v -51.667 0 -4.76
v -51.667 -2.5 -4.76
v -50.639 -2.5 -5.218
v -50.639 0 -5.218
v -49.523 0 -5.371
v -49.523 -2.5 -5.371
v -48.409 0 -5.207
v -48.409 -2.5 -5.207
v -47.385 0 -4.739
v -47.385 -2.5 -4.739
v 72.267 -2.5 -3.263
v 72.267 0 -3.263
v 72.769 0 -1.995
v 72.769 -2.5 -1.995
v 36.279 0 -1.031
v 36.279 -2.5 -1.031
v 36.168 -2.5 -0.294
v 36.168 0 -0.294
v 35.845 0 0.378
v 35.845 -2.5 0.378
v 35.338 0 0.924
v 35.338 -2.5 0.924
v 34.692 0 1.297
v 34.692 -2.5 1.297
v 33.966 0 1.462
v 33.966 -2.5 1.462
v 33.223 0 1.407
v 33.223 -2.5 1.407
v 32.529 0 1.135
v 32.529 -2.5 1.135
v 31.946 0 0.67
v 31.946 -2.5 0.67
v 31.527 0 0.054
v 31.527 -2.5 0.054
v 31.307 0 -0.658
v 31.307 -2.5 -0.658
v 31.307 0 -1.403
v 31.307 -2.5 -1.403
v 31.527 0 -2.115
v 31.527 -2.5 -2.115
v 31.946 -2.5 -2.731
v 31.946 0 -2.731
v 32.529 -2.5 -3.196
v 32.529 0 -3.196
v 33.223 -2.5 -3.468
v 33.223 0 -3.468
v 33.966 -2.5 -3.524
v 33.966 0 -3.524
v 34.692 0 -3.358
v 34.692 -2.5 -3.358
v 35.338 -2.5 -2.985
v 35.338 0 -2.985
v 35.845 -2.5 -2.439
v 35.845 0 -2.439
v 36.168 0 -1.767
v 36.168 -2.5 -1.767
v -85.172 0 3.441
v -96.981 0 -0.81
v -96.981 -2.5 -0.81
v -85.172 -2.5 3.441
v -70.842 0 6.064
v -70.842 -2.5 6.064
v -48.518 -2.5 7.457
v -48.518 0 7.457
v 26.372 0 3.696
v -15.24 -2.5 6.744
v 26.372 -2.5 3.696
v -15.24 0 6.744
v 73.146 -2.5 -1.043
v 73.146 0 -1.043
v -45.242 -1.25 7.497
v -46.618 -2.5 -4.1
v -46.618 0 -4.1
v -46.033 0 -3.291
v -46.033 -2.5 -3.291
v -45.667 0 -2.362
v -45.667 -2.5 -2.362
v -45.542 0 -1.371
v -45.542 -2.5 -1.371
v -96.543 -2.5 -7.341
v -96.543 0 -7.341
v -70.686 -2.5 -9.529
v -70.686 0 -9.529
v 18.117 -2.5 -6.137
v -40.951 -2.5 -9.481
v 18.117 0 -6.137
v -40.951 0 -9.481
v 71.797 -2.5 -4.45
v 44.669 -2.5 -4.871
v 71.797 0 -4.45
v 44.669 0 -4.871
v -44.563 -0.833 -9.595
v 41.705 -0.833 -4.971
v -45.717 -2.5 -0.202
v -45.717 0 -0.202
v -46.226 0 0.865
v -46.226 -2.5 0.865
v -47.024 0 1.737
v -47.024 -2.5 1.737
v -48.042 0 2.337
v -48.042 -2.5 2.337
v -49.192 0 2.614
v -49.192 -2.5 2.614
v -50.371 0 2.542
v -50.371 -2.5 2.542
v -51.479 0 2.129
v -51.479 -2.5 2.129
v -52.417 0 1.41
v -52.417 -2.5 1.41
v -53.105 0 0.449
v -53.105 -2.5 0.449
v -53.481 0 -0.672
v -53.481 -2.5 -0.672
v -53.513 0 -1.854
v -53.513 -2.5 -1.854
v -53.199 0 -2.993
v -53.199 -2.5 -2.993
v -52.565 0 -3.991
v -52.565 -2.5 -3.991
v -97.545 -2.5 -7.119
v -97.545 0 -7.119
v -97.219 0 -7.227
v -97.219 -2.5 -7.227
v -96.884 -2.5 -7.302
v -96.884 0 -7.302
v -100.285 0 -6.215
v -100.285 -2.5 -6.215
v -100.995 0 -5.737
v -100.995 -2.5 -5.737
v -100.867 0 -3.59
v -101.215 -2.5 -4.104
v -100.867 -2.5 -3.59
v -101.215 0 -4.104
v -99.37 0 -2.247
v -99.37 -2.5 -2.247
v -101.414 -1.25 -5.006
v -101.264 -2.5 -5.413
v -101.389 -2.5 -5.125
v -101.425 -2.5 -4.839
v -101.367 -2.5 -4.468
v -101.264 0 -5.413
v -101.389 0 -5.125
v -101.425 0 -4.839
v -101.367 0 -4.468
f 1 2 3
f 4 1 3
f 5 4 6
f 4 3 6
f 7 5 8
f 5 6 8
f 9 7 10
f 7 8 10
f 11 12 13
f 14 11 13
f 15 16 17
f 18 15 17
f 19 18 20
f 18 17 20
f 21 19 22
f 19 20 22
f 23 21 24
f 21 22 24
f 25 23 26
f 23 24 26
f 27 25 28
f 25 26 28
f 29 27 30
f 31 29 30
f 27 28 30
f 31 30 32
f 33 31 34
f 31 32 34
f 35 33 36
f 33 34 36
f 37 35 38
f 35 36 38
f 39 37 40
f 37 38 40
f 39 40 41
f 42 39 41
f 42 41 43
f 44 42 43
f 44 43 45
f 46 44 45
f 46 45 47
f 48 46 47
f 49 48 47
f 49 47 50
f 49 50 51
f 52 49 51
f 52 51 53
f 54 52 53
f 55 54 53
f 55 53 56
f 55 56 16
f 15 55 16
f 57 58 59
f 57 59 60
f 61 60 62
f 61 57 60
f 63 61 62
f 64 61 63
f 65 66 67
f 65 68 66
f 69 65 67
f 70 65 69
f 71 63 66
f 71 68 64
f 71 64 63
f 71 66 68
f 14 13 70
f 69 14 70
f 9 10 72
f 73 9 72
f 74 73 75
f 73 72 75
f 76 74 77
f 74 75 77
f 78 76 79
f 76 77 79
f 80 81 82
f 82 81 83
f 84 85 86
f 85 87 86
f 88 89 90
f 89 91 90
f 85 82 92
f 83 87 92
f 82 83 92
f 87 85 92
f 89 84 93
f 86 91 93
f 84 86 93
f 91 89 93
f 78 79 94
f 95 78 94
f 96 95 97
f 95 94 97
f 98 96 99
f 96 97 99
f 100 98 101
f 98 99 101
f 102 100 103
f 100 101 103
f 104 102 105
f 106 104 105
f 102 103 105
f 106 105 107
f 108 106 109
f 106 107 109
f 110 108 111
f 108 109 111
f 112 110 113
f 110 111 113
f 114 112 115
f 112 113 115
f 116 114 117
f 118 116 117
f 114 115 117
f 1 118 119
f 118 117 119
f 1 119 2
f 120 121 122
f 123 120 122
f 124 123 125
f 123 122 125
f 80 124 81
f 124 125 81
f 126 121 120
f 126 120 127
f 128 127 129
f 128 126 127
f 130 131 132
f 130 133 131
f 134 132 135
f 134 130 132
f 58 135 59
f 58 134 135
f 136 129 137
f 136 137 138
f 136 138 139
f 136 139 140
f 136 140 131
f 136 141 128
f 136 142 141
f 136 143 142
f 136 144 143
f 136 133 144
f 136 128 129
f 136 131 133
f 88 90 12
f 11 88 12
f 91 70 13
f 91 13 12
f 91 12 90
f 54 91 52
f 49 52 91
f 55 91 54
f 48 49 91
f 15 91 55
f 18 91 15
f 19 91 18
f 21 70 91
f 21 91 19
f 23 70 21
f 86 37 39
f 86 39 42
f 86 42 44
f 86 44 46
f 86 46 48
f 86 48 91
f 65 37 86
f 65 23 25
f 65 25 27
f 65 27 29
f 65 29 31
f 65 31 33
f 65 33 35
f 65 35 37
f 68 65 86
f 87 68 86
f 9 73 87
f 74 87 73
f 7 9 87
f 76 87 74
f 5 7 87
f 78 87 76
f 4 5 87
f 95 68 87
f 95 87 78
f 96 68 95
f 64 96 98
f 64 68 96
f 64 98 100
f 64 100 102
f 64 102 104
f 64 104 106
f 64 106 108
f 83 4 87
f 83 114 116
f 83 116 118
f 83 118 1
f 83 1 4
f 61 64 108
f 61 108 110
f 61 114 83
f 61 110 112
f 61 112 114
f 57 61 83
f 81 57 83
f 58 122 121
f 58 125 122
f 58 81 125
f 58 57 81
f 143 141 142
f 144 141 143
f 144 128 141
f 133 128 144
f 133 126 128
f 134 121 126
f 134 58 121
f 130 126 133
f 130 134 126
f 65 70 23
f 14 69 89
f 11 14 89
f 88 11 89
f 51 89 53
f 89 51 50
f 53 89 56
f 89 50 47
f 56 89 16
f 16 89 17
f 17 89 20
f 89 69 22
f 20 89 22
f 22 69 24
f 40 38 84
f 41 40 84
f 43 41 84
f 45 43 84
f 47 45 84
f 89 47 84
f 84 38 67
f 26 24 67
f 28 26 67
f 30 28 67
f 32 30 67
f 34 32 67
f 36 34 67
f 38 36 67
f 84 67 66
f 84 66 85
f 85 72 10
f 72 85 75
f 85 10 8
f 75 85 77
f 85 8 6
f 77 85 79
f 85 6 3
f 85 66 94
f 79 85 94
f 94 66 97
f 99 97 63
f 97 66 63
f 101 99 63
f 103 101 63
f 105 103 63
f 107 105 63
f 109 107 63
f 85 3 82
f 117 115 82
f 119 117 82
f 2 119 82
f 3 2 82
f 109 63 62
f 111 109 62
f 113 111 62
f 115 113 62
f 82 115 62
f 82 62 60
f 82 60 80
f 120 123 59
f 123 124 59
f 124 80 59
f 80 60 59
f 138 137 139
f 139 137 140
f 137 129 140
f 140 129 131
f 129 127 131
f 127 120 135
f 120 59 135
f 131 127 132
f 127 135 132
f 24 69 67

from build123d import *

# Parameters (mm, degrees)
F2_DEPTH = 2.5
F1_R     = 2.5
F3_DEPTH = 3
F4_DEPTH = 3


with BuildPart() as f2:
    # F0 (on Front) → F2 (new body)
    with BuildSketch(Plane.XZ):
        with BuildLine():
            add(Edge.make_bspline(
                [(-96.9805282175, -0.8100506688), (-84.7869920978, 5.1468541776), (-43.2313518226, 10.3846705605), (26.8477938201, 4.0208678603), (73.1462007926, -1.0427900778)],
                knots=[0, 0, 0, 0, 0.374886421, 0.9004696716, 0.9004696716, 0.9004696716, 0.9004696716], degree=3))
            add(Edge.make_bspline(
                [(-97.5447368223, -7.1186651935), (-99.939251346, -6.5508492693), (-102.885147974, -5.168950634), (-100.0067471137, -2.3789404522), (-96.9805282175, -0.8100506688)],
                knots=[0.0564585679, 0.0564585679, 0.0564585679, 0.0564585679, 0.4847104148, 1, 1, 1, 1], degree=3))
            add(Edge.make_bspline(
                [(-96.5428845142, -7.3406707446), (-96.8949965543, -7.2673488468), (-97.22905608, -7.1935231869), (-97.5447368223, -7.1186651935)],
                knots=[0, 0, 0, 0, 0.0564585679, 0.0564585679, 0.0564585679, 0.0564585679], degree=3))
            add(Edge.make_bspline(
                [(-96.5428845142, -7.3406707446), (-80.7020161693, -9.4302402111), (-44.2471235075, -11.1181020976), (27.9226364637, -4.7767282079), (62.4434148738, -4.5021877215), (71.7967184236, -4.4503783305)],
                knots=[0, 0, 0, 0, 0.2987594418, 0.6837410955, 0.8381168975, 0.8381168975, 0.8381168975, 0.8381168975], degree=3))
            Line((71.7967184236, -4.4503783305), (72.2670713195, -3.2626866351))
            add(Edge.make_bspline(
                [(-97.3825784566, -6.0471531808), (-82.3468325761, -8.841713568), (-44.2551066449, -8.6286827794), (32.5707299039, -3.8332069517), (63.1103828262, -3.2710139005), (72.2670713195, -3.2626866351)],
                knots=[0, 0, 0, 0, 0.3131273629, 0.7122131732, 0.9019797674, 0.9019797674, 0.9019797674, 0.9019797674], degree=3))
            add(Edge.make_bspline(
                [(-97.3825784566, -6.0471531808), (-98.6588937786, -5.8946130057), (-100.1661659123, -5.1778479876), (-99.9138553768, -4.2244412327), (-99.8196757147, -4.047003109)],
                knots=[0, 0, 0, 0, 0.4440177242, 0.5425000514, 0.5425000514, 0.5425000514, 0.5425000514], degree=3))
            add(Edge.make_bspline(
                [(-99.8196757147, -4.047003109), (-99.3821638101, -3.2227137691), (-97.9006497107, -2.3042858417), (-96.3385477662, -1.6362179573)],
                knots=[0.5425000514, 0.5425000514, 0.5425000514, 0.5425000514, 1, 1, 1, 1], degree=3))
            add(Edge.make_bspline(
                [(-96.3385477662, -1.6362179573), (-85.7442874691, 3.2900694446), (-41.4192830911, 9.6956733525), (28.5693195485, 2.5855104747), (72.7689680214, -1.9953434339)],
                knots=[0, 0, 0, 0, 0.384923117, 0.9441251659, 0.9441251659, 0.9441251659, 0.9441251659], degree=3))
            Line((72.7689680214, -1.9953434339), (73.1462007926, -1.0427900778))
        make_face()
        with BuildLine():
            add(Edge.make_bspline(
                [(-96.5428845142, -7.3406707446), (-96.8949965543, -7.2673488468), (-97.22905608, -7.1935231869), (-97.5447368223, -7.1186651935)],
                knots=[0, 0, 0, 0, 0.0564585679, 0.0564585679, 0.0564585679, 0.0564585679], degree=3))
            ThreePointArc((-97.5447368223, -7.1186651935), (-97.052492706, -7.2688477084), (-96.5428845142, -7.3406707446))
        make_face()
        with BuildLine():
            Line((72.2670713195, -3.2626866351), (72.7689680214, -1.9953434339))
            add(Edge.make_bspline(
                [(-96.3385477662, -1.6362179573), (-85.7442874691, 3.2900694446), (-41.4192830911, 9.6956733525), (28.5693195485, 2.5855104747), (72.7689680214, -1.9953434339)],
                knots=[0, 0, 0, 0, 0.384923117, 0.9441251659, 0.9441251659, 0.9441251659, 0.9441251659], degree=3))
            add(Edge.make_bspline(
                [(-99.8196757147, -4.047003109), (-99.3821638101, -3.2227137691), (-97.9006497107, -2.3042858417), (-96.3385477662, -1.6362179573)],
                knots=[0.5425000514, 0.5425000514, 0.5425000514, 0.5425000514, 1, 1, 1, 1], degree=3))
            add(Edge.make_bspline(
                [(-97.3825784566, -6.0471531808), (-98.6588937786, -5.8946130057), (-100.1661659123, -5.1778479876), (-99.9138553768, -4.2244412327), (-99.8196757147, -4.047003109)],
                knots=[0, 0, 0, 0, 0.4440177242, 0.5425000514, 0.5425000514, 0.5425000514, 0.5425000514], degree=3))
            add(Edge.make_bspline(
                [(-97.3825784566, -6.0471531808), (-82.3468325761, -8.841713568), (-44.2551066449, -8.6286827794), (32.5707299039, -3.8332069517), (63.1103828262, -3.2710139005), (72.2670713195, -3.2626866351)],
                knots=[0, 0, 0, 0, 0.3131273629, 0.7122131732, 0.9019797674, 0.9019797674, 0.9019797674, 0.9019797674], degree=3))
        make_face()
    extrude(amount=F2_DEPTH)


with BuildPart() as f2b:
    # F1 (on Front) → F2, piece 2 (new body)
    with BuildSketch(Plane.XZ):
        with BuildLine():
            ThreePointArc((-45.542362095, -1.3708024857), (-51.4789804014, 2.1291274472), (-51.6671168627, -4.7598166753))
            Line((-51.6671168627, -4.7598166753), (-47.385046135, -4.7391830831))
            ThreePointArc((-47.385046135, -4.7391830831), (-46.0331411102, -3.2905337378), (-45.542362095, -1.3708024857))
        make_face()
        with BuildLine():
            Line((-47.385046135, -4.7391830831), (-51.6671168627, -4.7598166753))
            ThreePointArc((-51.6671168627, -4.7598166753), (-49.523087913, -5.3707560487), (-47.385046135, -4.7391830831))
        make_face()
    extrude(amount=F2_DEPTH)


with BuildPart() as f2c:
    # F1 (on Front) → F2, piece 3 (new body)
    with BuildSketch(Plane.XZ):
        with Locations((33.7789729238, -1.0305350879)):
            Circle(F1_R)
    extrude(amount=F2_DEPTH)


with BuildPart() as f3_tool:
    # F3 (cut): a face of the model
    f3_faces = [f2b.part.faces().sort_by_distance(p)[0] for p in [
        (-49.542362095, -2.5, -1.3708024857),
    ]]
    extrude(f3_faces, amount=-F3_DEPTH)


with BuildPart() as f2_1:
    add(f2.part)

    # F3: cut by f3_tool
    add(f3_tool.part, mode=Mode.SUBTRACT)


with BuildPart() as f2b_1:
    add(f2b.part)

    # F3: cut by f3_tool
    add(f3_tool.part, mode=Mode.SUBTRACT)


with BuildPart() as f4_tool:
    # F4 (cut): a face of the model
    f4_faces = [f2c.part.faces().sort_by_distance(p)[0] for p in [
        (33.7789729238, -2.5, -1.0305350879),
    ]]
    extrude(f4_faces, amount=-F4_DEPTH)


with BuildPart() as f2_2:
    add(f2_1.part)

    # F4: cut by f4_tool
    add(f4_tool.part, mode=Mode.SUBTRACT)


with BuildPart() as f2c_1:
    add(f2c.part)

    # F4: cut by f4_tool
    add(f4_tool.part, mode=Mode.SUBTRACT)


solid = f2_2.part
